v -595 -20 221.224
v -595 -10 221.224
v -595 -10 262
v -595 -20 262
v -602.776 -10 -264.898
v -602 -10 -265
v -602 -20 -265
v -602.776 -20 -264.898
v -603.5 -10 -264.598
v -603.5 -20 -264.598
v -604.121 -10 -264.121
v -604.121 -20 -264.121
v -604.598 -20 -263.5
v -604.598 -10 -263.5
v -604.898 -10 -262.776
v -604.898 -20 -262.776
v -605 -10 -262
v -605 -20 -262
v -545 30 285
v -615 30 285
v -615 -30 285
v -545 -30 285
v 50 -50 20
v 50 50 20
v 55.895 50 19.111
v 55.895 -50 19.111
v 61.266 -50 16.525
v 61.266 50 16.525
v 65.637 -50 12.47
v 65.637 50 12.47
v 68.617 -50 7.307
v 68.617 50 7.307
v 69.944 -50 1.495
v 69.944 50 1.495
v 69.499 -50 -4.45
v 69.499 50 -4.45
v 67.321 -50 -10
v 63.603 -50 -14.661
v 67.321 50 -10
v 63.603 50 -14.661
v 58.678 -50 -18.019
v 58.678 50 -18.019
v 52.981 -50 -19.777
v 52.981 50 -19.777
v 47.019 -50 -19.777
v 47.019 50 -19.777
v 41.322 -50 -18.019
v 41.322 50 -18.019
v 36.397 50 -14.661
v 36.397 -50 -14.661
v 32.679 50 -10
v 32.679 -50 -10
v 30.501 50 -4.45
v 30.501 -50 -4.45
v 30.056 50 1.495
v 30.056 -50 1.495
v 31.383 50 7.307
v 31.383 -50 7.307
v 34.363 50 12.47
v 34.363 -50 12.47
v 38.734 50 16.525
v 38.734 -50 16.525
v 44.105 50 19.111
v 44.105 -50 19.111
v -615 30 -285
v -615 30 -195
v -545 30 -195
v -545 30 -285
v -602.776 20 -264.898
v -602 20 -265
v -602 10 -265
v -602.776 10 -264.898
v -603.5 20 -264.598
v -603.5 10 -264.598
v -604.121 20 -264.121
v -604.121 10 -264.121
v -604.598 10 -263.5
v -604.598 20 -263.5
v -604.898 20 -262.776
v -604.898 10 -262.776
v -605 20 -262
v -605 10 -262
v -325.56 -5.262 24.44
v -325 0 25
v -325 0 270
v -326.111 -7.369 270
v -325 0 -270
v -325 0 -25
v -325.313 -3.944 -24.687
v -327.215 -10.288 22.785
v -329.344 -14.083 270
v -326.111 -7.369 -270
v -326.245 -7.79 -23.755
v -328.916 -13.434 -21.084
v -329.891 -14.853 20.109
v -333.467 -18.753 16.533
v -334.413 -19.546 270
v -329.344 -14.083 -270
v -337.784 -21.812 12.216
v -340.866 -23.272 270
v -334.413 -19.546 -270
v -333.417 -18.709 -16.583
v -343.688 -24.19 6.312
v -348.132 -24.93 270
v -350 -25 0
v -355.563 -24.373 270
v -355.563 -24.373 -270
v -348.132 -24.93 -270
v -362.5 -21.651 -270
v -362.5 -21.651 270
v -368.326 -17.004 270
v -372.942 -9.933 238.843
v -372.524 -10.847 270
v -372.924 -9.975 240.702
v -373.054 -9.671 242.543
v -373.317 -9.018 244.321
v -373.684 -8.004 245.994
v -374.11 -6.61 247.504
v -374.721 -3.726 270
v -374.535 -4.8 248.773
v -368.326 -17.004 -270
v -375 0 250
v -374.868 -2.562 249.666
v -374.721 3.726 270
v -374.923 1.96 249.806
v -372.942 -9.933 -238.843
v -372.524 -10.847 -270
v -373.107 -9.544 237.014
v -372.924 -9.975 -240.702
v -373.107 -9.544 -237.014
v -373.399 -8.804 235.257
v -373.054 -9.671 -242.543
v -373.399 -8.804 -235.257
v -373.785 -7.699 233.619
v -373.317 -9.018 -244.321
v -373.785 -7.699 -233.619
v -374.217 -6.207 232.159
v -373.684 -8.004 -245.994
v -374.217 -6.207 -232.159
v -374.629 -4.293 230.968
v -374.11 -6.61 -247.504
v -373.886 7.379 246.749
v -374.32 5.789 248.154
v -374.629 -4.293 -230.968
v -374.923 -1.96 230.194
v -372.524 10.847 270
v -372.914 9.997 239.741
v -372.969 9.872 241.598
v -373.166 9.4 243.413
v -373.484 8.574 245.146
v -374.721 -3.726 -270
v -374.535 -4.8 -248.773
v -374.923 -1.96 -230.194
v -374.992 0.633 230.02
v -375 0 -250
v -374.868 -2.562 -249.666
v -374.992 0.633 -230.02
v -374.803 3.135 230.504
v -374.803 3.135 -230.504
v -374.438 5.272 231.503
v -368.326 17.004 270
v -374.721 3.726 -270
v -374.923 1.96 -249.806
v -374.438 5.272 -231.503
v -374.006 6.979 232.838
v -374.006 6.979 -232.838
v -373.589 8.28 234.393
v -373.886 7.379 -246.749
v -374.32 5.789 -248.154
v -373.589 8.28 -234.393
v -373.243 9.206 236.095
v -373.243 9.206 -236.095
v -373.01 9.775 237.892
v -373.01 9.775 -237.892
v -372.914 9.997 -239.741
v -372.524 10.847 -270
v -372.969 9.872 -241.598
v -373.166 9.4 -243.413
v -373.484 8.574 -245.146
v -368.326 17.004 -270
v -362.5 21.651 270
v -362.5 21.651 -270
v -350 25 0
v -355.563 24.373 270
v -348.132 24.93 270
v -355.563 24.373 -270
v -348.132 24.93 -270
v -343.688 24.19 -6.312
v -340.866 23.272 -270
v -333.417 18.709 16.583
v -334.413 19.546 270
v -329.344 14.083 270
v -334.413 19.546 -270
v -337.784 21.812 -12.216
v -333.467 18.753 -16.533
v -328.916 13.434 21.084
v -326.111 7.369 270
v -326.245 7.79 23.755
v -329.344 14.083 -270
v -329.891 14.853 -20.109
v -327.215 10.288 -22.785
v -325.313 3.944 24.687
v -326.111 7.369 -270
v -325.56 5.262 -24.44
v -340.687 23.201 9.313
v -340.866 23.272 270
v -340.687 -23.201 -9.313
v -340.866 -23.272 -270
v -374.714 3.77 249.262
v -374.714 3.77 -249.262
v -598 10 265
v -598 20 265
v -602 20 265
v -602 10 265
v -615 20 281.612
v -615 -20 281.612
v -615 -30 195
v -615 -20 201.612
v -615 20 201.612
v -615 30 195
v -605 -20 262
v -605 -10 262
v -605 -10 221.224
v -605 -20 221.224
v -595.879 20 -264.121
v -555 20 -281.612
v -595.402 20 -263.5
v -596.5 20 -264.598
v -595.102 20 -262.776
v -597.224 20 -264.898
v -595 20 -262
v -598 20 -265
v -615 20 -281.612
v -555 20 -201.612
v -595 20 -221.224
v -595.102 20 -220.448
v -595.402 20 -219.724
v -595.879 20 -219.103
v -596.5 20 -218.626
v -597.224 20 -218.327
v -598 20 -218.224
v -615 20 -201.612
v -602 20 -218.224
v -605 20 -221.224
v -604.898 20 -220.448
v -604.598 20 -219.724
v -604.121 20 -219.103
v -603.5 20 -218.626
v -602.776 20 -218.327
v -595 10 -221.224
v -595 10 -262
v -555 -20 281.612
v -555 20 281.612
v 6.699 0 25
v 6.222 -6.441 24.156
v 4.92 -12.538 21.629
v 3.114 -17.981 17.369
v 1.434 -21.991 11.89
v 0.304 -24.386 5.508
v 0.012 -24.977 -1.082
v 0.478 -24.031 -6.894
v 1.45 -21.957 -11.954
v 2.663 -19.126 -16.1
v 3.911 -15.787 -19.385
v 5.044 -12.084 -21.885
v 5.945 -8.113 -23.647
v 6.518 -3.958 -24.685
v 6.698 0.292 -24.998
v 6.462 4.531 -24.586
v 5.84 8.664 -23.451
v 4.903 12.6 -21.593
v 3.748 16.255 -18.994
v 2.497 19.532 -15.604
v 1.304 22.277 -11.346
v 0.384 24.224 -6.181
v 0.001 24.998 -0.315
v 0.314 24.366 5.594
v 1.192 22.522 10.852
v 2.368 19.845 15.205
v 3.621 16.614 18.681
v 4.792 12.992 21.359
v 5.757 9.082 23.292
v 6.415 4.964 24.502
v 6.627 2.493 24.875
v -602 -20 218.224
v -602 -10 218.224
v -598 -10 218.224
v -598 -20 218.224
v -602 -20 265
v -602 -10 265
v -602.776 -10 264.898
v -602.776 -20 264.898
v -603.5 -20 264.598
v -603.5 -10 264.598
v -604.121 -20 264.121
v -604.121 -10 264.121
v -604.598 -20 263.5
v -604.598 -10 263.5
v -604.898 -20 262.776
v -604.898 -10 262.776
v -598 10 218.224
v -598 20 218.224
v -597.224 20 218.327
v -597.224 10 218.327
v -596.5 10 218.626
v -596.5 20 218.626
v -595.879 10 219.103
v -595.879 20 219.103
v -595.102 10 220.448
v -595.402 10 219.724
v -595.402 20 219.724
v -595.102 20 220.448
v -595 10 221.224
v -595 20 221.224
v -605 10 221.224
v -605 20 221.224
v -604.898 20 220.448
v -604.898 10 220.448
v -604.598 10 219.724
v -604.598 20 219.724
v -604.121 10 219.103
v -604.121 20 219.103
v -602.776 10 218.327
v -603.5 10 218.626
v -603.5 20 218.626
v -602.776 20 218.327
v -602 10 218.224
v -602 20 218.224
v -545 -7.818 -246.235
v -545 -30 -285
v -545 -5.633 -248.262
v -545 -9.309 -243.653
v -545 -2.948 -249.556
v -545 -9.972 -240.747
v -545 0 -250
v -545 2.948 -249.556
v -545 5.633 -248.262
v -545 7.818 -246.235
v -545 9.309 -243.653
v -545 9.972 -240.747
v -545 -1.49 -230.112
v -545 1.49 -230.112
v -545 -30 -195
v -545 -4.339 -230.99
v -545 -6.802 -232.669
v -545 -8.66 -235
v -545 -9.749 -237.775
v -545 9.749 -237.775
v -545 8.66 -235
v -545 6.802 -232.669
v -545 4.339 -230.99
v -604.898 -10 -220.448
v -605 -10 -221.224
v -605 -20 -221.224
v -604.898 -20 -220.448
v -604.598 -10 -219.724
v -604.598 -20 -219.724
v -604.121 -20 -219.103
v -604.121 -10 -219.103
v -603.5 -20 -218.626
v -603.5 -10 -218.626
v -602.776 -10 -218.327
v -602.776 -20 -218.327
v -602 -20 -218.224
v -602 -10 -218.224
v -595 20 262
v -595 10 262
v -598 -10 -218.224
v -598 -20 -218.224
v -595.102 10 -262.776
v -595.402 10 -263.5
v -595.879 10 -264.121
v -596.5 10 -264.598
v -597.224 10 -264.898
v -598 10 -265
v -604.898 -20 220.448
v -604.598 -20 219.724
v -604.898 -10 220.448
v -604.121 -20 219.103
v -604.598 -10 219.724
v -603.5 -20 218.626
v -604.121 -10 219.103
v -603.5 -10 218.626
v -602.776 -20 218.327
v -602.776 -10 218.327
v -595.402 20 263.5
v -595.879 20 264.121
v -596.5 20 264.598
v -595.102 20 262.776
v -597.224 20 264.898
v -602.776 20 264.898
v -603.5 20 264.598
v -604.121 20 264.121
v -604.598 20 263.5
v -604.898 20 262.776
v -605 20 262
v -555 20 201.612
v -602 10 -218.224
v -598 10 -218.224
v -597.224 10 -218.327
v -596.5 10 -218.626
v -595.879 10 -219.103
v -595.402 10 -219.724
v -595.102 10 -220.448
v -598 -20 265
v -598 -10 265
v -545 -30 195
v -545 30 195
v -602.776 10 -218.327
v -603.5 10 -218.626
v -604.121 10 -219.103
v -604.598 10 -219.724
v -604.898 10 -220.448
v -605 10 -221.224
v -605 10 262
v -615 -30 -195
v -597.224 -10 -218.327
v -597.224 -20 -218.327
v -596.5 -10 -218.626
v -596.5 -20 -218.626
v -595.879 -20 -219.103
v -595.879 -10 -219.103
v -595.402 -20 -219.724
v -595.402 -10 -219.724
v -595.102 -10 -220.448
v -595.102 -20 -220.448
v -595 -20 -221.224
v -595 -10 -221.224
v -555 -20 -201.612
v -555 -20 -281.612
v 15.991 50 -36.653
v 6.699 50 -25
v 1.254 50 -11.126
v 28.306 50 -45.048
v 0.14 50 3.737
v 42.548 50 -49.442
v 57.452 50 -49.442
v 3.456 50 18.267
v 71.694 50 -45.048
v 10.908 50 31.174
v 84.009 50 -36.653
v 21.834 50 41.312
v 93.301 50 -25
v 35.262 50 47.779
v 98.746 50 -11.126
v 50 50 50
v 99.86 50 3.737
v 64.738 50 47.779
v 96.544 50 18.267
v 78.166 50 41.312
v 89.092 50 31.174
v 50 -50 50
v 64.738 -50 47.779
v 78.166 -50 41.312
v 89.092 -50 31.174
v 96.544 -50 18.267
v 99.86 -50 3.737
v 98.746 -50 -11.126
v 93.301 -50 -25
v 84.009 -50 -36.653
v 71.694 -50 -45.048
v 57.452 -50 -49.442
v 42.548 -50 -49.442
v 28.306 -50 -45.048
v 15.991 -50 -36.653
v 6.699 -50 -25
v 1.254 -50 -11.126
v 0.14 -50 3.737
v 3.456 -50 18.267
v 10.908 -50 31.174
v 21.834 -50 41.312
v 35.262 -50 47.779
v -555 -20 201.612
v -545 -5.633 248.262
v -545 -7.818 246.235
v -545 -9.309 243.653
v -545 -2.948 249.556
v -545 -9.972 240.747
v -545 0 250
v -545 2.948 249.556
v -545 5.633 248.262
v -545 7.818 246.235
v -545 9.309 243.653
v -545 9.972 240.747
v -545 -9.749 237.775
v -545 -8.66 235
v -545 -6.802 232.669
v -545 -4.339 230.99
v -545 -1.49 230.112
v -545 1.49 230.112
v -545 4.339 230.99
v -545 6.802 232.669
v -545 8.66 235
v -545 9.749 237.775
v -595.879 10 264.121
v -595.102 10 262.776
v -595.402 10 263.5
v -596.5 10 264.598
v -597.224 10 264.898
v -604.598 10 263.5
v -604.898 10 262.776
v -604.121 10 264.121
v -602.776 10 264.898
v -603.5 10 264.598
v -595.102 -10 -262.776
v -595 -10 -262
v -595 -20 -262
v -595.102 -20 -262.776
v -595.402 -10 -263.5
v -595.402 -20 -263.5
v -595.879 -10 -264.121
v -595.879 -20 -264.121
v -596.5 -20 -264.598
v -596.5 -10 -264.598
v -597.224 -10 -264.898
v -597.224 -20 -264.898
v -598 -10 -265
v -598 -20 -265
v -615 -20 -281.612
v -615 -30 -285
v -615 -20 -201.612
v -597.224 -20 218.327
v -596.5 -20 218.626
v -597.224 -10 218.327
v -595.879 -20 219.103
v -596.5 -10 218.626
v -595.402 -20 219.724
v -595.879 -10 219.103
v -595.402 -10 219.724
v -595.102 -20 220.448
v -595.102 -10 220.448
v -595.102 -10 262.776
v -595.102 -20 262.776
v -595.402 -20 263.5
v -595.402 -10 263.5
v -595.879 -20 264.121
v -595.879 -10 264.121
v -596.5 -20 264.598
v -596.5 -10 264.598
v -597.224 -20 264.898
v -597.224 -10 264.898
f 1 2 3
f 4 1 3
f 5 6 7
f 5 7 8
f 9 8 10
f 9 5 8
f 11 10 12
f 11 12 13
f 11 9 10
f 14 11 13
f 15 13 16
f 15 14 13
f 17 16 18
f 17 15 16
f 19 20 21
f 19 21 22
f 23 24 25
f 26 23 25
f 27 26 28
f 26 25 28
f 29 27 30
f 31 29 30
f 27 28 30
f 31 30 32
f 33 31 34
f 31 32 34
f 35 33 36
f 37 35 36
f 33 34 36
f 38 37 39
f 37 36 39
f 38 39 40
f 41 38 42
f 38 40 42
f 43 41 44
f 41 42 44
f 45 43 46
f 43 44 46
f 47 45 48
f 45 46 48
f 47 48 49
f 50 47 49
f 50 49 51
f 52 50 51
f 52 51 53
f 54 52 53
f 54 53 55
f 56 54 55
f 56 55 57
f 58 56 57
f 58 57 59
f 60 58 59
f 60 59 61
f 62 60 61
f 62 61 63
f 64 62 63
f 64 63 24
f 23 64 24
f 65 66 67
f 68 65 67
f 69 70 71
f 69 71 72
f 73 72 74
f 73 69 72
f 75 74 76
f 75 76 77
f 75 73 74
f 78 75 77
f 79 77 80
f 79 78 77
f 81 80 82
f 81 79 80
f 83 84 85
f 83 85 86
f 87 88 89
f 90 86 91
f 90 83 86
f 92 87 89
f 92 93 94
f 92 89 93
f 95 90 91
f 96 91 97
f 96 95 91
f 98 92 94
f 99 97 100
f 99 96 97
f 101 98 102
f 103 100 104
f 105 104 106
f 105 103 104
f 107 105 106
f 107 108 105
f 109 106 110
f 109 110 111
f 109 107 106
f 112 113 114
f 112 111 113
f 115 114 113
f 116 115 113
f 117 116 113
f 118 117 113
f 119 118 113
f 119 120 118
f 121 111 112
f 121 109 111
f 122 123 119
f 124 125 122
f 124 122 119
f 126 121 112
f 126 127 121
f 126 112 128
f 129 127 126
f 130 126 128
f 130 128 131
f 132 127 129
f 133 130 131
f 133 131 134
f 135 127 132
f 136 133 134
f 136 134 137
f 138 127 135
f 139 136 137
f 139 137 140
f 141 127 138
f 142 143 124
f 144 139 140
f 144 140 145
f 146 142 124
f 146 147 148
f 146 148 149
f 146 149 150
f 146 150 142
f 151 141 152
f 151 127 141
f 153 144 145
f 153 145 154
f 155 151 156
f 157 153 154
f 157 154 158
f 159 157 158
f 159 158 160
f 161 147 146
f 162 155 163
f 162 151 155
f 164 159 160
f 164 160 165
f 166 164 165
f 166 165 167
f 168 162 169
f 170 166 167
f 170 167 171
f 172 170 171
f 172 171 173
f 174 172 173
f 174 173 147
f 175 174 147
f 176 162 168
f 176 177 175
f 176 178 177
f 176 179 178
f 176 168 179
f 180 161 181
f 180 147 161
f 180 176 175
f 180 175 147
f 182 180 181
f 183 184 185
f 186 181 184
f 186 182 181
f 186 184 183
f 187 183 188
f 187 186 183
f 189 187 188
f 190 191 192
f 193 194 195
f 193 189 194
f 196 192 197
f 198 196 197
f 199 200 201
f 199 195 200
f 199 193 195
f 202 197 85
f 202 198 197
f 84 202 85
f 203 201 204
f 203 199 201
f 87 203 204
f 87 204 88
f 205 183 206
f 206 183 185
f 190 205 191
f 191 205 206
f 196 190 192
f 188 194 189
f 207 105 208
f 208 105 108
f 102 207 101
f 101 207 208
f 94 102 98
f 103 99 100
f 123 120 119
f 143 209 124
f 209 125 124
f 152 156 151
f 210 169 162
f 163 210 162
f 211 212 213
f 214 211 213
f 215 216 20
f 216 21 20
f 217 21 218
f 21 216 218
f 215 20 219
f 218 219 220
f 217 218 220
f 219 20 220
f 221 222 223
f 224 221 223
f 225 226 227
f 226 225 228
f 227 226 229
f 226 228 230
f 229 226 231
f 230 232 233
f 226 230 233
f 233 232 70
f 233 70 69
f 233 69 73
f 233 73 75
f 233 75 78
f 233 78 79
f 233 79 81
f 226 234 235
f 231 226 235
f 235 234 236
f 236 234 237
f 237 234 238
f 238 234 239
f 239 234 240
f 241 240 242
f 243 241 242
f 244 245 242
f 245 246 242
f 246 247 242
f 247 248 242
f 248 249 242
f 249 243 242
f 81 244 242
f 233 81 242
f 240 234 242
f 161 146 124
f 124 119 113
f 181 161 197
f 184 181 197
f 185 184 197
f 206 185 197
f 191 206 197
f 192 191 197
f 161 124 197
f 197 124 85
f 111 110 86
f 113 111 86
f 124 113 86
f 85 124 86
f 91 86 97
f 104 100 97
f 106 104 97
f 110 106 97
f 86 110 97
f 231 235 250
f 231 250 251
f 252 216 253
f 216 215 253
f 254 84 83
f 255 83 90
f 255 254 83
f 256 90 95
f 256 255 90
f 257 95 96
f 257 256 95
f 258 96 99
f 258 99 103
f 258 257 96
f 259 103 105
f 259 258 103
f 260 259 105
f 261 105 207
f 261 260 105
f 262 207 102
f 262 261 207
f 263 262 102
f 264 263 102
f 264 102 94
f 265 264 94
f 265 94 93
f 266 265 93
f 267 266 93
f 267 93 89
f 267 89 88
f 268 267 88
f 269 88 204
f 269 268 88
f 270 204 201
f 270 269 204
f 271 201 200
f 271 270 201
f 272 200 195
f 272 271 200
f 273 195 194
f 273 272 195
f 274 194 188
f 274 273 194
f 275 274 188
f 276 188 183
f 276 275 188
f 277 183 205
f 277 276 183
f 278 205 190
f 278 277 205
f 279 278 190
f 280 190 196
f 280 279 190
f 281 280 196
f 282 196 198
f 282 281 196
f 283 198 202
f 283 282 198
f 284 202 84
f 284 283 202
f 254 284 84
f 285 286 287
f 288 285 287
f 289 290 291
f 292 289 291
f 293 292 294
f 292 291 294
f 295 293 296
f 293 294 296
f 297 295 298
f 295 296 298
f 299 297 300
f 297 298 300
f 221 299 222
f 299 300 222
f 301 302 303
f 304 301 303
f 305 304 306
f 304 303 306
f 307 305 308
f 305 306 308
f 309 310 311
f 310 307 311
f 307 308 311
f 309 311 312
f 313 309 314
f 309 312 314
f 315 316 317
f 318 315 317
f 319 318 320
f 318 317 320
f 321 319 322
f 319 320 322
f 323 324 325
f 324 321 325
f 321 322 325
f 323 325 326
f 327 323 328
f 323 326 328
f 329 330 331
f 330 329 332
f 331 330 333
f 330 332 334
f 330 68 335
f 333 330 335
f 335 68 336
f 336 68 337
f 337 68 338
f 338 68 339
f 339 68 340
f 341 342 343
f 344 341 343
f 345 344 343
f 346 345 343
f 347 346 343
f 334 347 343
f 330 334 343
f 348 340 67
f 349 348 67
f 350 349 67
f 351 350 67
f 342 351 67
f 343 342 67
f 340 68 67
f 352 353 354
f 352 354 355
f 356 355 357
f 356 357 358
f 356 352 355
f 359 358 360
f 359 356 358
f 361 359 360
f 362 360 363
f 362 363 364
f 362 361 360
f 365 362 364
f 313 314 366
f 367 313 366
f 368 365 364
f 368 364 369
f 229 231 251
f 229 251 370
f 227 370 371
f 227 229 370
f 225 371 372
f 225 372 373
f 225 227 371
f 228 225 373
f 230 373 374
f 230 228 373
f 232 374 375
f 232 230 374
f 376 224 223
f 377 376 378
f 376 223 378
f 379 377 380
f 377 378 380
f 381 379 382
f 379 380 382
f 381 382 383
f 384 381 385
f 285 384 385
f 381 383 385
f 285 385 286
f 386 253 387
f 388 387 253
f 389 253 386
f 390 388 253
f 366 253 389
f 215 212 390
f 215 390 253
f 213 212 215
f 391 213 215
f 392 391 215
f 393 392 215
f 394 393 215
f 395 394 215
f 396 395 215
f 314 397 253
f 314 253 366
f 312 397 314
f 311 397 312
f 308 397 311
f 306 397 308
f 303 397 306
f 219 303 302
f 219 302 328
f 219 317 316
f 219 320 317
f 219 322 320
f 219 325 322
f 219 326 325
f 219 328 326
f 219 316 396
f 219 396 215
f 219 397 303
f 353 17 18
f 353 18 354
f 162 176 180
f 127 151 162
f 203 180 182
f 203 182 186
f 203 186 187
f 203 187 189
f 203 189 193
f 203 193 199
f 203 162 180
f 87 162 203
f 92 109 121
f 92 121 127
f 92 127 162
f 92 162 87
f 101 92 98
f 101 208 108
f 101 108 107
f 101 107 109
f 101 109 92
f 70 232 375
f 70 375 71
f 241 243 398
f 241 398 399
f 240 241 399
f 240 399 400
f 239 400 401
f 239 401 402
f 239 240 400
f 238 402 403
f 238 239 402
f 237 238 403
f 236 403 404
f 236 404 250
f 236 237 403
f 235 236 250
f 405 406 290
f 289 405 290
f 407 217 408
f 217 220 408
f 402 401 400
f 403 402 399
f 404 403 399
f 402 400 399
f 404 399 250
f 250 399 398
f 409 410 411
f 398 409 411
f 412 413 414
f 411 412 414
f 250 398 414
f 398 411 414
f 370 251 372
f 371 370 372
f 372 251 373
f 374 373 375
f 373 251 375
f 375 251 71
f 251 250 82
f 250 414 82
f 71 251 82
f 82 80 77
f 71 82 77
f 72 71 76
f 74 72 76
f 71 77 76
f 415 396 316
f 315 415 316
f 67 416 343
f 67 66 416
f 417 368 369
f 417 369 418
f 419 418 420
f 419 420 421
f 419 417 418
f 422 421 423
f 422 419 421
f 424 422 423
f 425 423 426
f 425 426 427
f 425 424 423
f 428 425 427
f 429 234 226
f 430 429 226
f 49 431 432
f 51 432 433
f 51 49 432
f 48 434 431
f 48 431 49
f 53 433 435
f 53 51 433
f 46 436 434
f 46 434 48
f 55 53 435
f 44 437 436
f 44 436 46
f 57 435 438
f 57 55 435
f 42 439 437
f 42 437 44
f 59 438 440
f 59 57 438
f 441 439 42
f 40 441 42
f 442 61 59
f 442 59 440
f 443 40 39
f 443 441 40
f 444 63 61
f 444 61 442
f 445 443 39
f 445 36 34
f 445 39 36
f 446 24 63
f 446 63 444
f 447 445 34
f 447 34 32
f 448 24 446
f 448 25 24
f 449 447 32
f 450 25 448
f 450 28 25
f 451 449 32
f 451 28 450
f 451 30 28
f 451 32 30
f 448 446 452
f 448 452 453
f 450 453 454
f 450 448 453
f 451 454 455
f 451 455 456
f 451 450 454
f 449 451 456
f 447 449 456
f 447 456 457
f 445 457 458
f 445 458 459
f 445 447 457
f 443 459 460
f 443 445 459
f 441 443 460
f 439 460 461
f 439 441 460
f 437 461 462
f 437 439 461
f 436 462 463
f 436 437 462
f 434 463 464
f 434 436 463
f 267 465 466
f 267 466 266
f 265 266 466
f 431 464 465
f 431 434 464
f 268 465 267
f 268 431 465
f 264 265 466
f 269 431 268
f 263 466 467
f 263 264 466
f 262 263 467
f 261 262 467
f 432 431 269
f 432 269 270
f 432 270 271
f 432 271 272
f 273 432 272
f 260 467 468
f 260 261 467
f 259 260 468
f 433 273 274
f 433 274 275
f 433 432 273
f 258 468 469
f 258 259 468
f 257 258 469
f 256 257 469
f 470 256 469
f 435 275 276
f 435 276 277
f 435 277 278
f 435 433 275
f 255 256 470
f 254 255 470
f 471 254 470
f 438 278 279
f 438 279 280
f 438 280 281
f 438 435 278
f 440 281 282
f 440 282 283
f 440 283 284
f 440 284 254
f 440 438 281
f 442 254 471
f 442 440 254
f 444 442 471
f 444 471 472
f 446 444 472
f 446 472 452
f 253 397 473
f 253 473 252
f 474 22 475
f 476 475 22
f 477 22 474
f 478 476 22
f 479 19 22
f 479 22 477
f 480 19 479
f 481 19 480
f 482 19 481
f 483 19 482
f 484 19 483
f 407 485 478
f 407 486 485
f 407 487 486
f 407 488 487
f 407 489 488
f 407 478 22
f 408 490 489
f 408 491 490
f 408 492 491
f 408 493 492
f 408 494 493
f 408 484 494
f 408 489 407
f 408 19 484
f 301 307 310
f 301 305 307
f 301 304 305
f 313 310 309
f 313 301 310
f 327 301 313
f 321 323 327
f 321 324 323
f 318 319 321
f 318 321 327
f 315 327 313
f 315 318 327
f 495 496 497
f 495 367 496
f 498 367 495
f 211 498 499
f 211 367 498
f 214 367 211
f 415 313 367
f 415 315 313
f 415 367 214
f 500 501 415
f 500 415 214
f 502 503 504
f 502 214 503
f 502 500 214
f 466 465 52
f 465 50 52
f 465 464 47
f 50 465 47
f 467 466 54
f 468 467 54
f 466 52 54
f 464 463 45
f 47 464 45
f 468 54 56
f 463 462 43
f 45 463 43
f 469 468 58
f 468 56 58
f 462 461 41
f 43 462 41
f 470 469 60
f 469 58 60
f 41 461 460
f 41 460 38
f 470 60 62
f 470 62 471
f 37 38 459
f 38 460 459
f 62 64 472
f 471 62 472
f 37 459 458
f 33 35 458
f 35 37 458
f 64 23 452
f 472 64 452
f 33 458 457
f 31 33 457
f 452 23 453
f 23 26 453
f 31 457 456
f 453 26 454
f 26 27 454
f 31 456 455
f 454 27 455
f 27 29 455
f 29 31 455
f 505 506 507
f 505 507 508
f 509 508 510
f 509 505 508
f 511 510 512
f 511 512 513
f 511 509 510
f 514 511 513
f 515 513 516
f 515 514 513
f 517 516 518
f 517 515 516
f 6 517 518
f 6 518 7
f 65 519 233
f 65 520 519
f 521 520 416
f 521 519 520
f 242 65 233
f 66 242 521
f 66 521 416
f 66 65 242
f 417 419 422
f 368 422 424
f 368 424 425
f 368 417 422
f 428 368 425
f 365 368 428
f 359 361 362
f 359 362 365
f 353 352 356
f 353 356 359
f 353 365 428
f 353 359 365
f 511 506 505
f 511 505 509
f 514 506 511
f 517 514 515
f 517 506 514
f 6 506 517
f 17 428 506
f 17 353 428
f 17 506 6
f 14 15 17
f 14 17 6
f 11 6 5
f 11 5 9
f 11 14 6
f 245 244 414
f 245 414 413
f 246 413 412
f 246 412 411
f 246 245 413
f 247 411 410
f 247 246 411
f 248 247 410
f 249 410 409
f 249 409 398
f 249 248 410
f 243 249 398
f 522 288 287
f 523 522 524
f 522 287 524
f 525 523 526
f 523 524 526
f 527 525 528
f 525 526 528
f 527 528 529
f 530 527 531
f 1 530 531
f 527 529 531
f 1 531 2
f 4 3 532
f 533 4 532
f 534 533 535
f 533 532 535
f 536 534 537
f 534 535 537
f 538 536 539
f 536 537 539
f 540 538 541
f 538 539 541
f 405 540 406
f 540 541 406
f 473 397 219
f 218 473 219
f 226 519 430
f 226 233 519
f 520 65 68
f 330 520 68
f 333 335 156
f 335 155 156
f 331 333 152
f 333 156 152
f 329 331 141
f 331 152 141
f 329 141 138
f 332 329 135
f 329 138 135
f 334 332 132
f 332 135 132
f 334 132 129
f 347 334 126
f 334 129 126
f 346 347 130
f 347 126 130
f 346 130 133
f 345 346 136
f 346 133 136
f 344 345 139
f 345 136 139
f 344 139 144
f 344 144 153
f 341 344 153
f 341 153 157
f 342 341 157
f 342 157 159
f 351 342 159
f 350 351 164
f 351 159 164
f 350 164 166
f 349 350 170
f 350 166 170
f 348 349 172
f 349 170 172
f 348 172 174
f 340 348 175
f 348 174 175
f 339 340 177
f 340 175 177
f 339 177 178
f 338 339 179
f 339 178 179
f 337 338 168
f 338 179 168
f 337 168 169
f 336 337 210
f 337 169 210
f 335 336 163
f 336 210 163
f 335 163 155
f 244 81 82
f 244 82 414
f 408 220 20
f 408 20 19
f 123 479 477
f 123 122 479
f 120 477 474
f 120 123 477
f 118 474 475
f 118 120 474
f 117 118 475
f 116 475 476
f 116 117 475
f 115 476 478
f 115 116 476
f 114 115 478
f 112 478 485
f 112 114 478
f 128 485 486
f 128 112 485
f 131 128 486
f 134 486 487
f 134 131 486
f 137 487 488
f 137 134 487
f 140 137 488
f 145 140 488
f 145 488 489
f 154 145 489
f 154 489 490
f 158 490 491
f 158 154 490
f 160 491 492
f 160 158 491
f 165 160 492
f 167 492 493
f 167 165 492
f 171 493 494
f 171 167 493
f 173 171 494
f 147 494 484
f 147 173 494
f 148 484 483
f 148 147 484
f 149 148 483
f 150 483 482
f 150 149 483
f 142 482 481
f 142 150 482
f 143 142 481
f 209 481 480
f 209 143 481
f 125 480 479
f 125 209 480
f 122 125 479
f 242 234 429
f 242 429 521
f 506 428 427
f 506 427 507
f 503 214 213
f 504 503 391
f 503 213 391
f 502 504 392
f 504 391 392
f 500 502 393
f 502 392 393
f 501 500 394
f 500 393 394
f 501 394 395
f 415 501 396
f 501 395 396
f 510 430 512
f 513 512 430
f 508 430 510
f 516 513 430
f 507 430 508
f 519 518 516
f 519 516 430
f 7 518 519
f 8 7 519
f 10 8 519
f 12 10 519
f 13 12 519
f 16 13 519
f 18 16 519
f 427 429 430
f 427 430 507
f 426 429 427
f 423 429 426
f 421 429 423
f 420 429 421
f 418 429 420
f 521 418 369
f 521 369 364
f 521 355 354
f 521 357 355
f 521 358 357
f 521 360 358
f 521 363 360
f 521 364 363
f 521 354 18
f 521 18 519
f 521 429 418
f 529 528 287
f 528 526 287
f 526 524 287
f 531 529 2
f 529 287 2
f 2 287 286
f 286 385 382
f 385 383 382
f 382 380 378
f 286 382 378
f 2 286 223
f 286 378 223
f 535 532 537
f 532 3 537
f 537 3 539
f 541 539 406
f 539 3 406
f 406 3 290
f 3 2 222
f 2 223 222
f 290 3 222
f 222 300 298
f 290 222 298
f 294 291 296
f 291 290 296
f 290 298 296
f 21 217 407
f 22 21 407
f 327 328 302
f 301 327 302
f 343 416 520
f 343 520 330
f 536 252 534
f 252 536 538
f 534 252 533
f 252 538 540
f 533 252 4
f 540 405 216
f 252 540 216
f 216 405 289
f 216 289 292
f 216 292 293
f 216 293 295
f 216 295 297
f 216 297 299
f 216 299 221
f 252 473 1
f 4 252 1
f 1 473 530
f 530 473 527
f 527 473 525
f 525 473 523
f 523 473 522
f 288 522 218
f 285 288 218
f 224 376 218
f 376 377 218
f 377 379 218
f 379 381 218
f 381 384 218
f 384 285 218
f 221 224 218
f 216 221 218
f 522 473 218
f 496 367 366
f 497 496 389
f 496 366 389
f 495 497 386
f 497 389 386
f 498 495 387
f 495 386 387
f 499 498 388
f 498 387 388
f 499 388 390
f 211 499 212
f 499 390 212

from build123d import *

# Parameters (mm, degrees)
SKETCH1_W           = 400
SKETCH1_H           = 25
SKETCH2_W           = 25
SKETCH2_H           = 540
SKETCH4_R           = 50
BOSS_EXTRUDE1_DEPTH = 50
SKETCH5_W           = 200
SKETCH5_H           = 10
SKETCH6_R           = 20
CUT_EXTRUDE1_DEPTH  = 621.805927955
SKETCH7_W           = 70
SKETCH7_H           = 90
BOSS_EXTRUDE2_DEPTH = 30
CUT_EXTRUDE2_DEPTH  = 20
SKETCH10_W          = 53.225586826
SKETCH10_H          = 20
CUT_EXTRUDE3_DEPTH  = 40


with BuildPart() as part:
    # Sketch1 → Revolve1 (revolve)
    with BuildSketch(Plane(origin=(0, 0, 0), x_dir=(1, 0, 0), z_dir=(0, 1, 0))):
        with Locations((-150, -12.5)):
            Rectangle(SKETCH1_W, SKETCH1_H)
    revolve(axis=Axis((-350, 0, 0), (1, 0, 0)))

    # Sketch2 → Revolve2 (revolve)
    with BuildSketch(Plane(origin=(0, 0, 0), x_dir=(1, 0, 0), z_dir=(0, 1, 0)), mode=Mode.PRIVATE) as revolve2_sk:
        with Locations((-362.5, 0)):
            Rectangle(SKETCH2_W, SKETCH2_H)
    revolve(revolve2_sk.sketch.rotate(Axis((-350, 0, 270), (0, 0, -1)), 180), axis=Axis((-350, 0, 270), (0, 0, -1)))

    # Sketch4 → Boss-Extrude1 (add, symmetric)
    with BuildSketch(Plane(origin=(0, 0, 0), x_dir=(1, 0, 0), z_dir=(0, 1, 0))):
        with Locations(Location((50, 0, 0), (0, 0, 270))):
            Circle(SKETCH4_R)
    extrude(amount=BOSS_EXTRUDE1_DEPTH, both=True)

    # Sketch5 → Revolve-Thin1 (revolve)
    with BuildSketch(Plane(origin=(0, 0, 0), x_dir=(1, 0, 0), z_dir=(0, 1, 0)), mode=Mode.PRIVATE) as revolve_thin1_sk:
        with Locations((-450, 235)):
            Rectangle(SKETCH5_W, SKETCH5_H)
    revolve_thin1 = revolve(revolve_thin1_sk.sketch.rotate(Axis((-350, 0, -240), (-1, 0, 0)), 180), axis=Axis((-350, 0, -240), (-1, 0, 0)))

    # Mirror2: Revolve-Thin1 across plane
    add(revolve_thin1.mirror(Plane.XY))

    # Sketch6 → Cut-Extrude1 (cut, through all)
    with BuildSketch(Plane(origin=(0, 50, 0), x_dir=(1, 0, 0), z_dir=(0, 1, 0))):
        with Locations(Location((50, 0, 0), (0, 0, 270))):
            Circle(SKETCH6_R)
    extrude(amount=-CUT_EXTRUDE1_DEPTH, mode=Mode.SUBTRACT)

    # Sketch7 → Boss-Extrude2 (add, symmetric)
    with BuildSketch(Plane(origin=(0, 0, 0), x_dir=(1, 0, 0), z_dir=(0, 1, 0))):
        with Locations((-580, -240)):
            Rectangle(SKETCH7_W, SKETCH7_H)
    boss_extrude2 = extrude(amount=BOSS_EXTRUDE2_DEPTH, both=True)

    # Sketch9 → Cut-Extrude2 (cut, symmetric)
    with BuildSketch(Plane(origin=(0, 0, 0), x_dir=(1, 0, 0), z_dir=(0, 1, 0))):
        Polygon((-575, -281.612233807), (-615, -281.612233807), (-615, -201.612233807), (-575, -201.612233807), (-555, -201.612233807), (-555, -281.612233807), align=None)
        with BuildLine():
            Line((-598, -265), (-602, -265))
            ThreePointArc((-602, -265), (-604.121320344, -264.121320344), (-605, -262))
            Line((-605, -262), (-605, -221.224467614))
            ThreePointArc((-605, -221.224467614), (-604.121320344, -219.103147271), (-602, -218.224467614))
            Line((-602, -218.224467614), (-598, -218.224467614))
            ThreePointArc((-598, -218.224467614), (-595.878679656, -219.103147271), (-595, -221.224467614))
            Line((-595, -221.224467614), (-595, -262))
            ThreePointArc((-595, -262), (-595.878679656, -264.121320344), (-598, -265))
        make_face(mode=Mode.SUBTRACT)
    cut_extrude2 = extrude(amount=CUT_EXTRUDE2_DEPTH, both=True, mode=Mode.SUBTRACT)

    # Sketch10 → Cut-Extrude3 (cut)
    with BuildSketch(Plane.ZY.offset(605)):
        with Locations((240, 0)):
            Rectangle(SKETCH10_W, SKETCH10_H)
    cut_extrude3 = extrude(amount=-CUT_EXTRUDE3_DEPTH, mode=Mode.SUBTRACT)

    # Mirror3: Boss-Extrude2, Cut-Extrude2, Cut-Extrude3 across plane
    add(boss_extrude2.mirror(Plane.XY))
    add(cut_extrude2.mirror(Plane.XY), mode=Mode.SUBTRACT)
    add(cut_extrude3.mirror(Plane.XY), mode=Mode.SUBTRACT)


solid = part.part
